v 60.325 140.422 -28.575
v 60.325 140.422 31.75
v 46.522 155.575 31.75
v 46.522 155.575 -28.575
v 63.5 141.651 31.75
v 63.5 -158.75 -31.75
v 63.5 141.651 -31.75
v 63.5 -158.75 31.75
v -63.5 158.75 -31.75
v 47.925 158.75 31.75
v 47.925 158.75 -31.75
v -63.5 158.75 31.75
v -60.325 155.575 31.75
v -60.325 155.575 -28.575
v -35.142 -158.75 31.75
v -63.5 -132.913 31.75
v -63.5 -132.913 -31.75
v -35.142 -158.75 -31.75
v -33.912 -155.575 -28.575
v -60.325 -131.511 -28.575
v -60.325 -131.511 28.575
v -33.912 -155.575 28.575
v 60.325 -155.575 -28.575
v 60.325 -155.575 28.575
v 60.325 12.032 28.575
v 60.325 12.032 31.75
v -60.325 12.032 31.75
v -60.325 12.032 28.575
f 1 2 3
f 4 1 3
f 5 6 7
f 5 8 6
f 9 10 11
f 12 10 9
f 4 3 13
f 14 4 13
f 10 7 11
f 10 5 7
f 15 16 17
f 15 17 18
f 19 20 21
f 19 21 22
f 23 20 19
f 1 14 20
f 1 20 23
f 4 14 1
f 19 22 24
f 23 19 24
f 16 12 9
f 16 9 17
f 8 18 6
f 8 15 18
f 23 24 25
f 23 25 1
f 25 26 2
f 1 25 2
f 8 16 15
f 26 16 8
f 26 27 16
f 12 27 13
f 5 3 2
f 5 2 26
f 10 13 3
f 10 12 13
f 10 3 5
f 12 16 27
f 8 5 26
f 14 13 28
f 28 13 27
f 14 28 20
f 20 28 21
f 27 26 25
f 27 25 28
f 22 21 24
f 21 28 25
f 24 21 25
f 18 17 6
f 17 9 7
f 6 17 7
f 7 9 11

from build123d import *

# Parameters (mm, degrees)
F1_DEPTH = 31.75
F3_DEPTH = 60.325
F5_DEPTH = 3.175


with BuildPart() as f1:
    # F0 (on Top) → F1 (new body, symmetric)
    with BuildSketch(Plane.XY):
        Polygon((63.5, 141.6507737828), (47.9251928627, 158.75), (-63.5, 158.75), (-63.5, -132.9134553671), (-35.1417474449, -158.75), (63.5, -158.75), align=None)
    extrude(amount=F1_DEPTH, both=True)

    # F2 (on face) → F3 (cut)
    with BuildSketch(Plane.XY.offset(31.75)):
        Polygon((-60.325, -131.5109922598), (-33.9122881347, -155.575), (60.325, -155.575), (60.325, 140.4215420307), (46.5224932469, 155.575), (-60.325, 155.575), align=None)
    extrude(amount=-F3_DEPTH, mode=Mode.SUBTRACT)

    # F4 (on face) → F5 (join)
    with BuildSketch(Plane.XY.offset(31.75)):
        Polygon((60.325, 12.0320038701), (-60.325, 12.0320038701), (-60.325, -131.5109922598), (-33.9122881347, -155.575), (60.325, -155.575), align=None)
    extrude(amount=-F5_DEPTH)


solid = f1.part
